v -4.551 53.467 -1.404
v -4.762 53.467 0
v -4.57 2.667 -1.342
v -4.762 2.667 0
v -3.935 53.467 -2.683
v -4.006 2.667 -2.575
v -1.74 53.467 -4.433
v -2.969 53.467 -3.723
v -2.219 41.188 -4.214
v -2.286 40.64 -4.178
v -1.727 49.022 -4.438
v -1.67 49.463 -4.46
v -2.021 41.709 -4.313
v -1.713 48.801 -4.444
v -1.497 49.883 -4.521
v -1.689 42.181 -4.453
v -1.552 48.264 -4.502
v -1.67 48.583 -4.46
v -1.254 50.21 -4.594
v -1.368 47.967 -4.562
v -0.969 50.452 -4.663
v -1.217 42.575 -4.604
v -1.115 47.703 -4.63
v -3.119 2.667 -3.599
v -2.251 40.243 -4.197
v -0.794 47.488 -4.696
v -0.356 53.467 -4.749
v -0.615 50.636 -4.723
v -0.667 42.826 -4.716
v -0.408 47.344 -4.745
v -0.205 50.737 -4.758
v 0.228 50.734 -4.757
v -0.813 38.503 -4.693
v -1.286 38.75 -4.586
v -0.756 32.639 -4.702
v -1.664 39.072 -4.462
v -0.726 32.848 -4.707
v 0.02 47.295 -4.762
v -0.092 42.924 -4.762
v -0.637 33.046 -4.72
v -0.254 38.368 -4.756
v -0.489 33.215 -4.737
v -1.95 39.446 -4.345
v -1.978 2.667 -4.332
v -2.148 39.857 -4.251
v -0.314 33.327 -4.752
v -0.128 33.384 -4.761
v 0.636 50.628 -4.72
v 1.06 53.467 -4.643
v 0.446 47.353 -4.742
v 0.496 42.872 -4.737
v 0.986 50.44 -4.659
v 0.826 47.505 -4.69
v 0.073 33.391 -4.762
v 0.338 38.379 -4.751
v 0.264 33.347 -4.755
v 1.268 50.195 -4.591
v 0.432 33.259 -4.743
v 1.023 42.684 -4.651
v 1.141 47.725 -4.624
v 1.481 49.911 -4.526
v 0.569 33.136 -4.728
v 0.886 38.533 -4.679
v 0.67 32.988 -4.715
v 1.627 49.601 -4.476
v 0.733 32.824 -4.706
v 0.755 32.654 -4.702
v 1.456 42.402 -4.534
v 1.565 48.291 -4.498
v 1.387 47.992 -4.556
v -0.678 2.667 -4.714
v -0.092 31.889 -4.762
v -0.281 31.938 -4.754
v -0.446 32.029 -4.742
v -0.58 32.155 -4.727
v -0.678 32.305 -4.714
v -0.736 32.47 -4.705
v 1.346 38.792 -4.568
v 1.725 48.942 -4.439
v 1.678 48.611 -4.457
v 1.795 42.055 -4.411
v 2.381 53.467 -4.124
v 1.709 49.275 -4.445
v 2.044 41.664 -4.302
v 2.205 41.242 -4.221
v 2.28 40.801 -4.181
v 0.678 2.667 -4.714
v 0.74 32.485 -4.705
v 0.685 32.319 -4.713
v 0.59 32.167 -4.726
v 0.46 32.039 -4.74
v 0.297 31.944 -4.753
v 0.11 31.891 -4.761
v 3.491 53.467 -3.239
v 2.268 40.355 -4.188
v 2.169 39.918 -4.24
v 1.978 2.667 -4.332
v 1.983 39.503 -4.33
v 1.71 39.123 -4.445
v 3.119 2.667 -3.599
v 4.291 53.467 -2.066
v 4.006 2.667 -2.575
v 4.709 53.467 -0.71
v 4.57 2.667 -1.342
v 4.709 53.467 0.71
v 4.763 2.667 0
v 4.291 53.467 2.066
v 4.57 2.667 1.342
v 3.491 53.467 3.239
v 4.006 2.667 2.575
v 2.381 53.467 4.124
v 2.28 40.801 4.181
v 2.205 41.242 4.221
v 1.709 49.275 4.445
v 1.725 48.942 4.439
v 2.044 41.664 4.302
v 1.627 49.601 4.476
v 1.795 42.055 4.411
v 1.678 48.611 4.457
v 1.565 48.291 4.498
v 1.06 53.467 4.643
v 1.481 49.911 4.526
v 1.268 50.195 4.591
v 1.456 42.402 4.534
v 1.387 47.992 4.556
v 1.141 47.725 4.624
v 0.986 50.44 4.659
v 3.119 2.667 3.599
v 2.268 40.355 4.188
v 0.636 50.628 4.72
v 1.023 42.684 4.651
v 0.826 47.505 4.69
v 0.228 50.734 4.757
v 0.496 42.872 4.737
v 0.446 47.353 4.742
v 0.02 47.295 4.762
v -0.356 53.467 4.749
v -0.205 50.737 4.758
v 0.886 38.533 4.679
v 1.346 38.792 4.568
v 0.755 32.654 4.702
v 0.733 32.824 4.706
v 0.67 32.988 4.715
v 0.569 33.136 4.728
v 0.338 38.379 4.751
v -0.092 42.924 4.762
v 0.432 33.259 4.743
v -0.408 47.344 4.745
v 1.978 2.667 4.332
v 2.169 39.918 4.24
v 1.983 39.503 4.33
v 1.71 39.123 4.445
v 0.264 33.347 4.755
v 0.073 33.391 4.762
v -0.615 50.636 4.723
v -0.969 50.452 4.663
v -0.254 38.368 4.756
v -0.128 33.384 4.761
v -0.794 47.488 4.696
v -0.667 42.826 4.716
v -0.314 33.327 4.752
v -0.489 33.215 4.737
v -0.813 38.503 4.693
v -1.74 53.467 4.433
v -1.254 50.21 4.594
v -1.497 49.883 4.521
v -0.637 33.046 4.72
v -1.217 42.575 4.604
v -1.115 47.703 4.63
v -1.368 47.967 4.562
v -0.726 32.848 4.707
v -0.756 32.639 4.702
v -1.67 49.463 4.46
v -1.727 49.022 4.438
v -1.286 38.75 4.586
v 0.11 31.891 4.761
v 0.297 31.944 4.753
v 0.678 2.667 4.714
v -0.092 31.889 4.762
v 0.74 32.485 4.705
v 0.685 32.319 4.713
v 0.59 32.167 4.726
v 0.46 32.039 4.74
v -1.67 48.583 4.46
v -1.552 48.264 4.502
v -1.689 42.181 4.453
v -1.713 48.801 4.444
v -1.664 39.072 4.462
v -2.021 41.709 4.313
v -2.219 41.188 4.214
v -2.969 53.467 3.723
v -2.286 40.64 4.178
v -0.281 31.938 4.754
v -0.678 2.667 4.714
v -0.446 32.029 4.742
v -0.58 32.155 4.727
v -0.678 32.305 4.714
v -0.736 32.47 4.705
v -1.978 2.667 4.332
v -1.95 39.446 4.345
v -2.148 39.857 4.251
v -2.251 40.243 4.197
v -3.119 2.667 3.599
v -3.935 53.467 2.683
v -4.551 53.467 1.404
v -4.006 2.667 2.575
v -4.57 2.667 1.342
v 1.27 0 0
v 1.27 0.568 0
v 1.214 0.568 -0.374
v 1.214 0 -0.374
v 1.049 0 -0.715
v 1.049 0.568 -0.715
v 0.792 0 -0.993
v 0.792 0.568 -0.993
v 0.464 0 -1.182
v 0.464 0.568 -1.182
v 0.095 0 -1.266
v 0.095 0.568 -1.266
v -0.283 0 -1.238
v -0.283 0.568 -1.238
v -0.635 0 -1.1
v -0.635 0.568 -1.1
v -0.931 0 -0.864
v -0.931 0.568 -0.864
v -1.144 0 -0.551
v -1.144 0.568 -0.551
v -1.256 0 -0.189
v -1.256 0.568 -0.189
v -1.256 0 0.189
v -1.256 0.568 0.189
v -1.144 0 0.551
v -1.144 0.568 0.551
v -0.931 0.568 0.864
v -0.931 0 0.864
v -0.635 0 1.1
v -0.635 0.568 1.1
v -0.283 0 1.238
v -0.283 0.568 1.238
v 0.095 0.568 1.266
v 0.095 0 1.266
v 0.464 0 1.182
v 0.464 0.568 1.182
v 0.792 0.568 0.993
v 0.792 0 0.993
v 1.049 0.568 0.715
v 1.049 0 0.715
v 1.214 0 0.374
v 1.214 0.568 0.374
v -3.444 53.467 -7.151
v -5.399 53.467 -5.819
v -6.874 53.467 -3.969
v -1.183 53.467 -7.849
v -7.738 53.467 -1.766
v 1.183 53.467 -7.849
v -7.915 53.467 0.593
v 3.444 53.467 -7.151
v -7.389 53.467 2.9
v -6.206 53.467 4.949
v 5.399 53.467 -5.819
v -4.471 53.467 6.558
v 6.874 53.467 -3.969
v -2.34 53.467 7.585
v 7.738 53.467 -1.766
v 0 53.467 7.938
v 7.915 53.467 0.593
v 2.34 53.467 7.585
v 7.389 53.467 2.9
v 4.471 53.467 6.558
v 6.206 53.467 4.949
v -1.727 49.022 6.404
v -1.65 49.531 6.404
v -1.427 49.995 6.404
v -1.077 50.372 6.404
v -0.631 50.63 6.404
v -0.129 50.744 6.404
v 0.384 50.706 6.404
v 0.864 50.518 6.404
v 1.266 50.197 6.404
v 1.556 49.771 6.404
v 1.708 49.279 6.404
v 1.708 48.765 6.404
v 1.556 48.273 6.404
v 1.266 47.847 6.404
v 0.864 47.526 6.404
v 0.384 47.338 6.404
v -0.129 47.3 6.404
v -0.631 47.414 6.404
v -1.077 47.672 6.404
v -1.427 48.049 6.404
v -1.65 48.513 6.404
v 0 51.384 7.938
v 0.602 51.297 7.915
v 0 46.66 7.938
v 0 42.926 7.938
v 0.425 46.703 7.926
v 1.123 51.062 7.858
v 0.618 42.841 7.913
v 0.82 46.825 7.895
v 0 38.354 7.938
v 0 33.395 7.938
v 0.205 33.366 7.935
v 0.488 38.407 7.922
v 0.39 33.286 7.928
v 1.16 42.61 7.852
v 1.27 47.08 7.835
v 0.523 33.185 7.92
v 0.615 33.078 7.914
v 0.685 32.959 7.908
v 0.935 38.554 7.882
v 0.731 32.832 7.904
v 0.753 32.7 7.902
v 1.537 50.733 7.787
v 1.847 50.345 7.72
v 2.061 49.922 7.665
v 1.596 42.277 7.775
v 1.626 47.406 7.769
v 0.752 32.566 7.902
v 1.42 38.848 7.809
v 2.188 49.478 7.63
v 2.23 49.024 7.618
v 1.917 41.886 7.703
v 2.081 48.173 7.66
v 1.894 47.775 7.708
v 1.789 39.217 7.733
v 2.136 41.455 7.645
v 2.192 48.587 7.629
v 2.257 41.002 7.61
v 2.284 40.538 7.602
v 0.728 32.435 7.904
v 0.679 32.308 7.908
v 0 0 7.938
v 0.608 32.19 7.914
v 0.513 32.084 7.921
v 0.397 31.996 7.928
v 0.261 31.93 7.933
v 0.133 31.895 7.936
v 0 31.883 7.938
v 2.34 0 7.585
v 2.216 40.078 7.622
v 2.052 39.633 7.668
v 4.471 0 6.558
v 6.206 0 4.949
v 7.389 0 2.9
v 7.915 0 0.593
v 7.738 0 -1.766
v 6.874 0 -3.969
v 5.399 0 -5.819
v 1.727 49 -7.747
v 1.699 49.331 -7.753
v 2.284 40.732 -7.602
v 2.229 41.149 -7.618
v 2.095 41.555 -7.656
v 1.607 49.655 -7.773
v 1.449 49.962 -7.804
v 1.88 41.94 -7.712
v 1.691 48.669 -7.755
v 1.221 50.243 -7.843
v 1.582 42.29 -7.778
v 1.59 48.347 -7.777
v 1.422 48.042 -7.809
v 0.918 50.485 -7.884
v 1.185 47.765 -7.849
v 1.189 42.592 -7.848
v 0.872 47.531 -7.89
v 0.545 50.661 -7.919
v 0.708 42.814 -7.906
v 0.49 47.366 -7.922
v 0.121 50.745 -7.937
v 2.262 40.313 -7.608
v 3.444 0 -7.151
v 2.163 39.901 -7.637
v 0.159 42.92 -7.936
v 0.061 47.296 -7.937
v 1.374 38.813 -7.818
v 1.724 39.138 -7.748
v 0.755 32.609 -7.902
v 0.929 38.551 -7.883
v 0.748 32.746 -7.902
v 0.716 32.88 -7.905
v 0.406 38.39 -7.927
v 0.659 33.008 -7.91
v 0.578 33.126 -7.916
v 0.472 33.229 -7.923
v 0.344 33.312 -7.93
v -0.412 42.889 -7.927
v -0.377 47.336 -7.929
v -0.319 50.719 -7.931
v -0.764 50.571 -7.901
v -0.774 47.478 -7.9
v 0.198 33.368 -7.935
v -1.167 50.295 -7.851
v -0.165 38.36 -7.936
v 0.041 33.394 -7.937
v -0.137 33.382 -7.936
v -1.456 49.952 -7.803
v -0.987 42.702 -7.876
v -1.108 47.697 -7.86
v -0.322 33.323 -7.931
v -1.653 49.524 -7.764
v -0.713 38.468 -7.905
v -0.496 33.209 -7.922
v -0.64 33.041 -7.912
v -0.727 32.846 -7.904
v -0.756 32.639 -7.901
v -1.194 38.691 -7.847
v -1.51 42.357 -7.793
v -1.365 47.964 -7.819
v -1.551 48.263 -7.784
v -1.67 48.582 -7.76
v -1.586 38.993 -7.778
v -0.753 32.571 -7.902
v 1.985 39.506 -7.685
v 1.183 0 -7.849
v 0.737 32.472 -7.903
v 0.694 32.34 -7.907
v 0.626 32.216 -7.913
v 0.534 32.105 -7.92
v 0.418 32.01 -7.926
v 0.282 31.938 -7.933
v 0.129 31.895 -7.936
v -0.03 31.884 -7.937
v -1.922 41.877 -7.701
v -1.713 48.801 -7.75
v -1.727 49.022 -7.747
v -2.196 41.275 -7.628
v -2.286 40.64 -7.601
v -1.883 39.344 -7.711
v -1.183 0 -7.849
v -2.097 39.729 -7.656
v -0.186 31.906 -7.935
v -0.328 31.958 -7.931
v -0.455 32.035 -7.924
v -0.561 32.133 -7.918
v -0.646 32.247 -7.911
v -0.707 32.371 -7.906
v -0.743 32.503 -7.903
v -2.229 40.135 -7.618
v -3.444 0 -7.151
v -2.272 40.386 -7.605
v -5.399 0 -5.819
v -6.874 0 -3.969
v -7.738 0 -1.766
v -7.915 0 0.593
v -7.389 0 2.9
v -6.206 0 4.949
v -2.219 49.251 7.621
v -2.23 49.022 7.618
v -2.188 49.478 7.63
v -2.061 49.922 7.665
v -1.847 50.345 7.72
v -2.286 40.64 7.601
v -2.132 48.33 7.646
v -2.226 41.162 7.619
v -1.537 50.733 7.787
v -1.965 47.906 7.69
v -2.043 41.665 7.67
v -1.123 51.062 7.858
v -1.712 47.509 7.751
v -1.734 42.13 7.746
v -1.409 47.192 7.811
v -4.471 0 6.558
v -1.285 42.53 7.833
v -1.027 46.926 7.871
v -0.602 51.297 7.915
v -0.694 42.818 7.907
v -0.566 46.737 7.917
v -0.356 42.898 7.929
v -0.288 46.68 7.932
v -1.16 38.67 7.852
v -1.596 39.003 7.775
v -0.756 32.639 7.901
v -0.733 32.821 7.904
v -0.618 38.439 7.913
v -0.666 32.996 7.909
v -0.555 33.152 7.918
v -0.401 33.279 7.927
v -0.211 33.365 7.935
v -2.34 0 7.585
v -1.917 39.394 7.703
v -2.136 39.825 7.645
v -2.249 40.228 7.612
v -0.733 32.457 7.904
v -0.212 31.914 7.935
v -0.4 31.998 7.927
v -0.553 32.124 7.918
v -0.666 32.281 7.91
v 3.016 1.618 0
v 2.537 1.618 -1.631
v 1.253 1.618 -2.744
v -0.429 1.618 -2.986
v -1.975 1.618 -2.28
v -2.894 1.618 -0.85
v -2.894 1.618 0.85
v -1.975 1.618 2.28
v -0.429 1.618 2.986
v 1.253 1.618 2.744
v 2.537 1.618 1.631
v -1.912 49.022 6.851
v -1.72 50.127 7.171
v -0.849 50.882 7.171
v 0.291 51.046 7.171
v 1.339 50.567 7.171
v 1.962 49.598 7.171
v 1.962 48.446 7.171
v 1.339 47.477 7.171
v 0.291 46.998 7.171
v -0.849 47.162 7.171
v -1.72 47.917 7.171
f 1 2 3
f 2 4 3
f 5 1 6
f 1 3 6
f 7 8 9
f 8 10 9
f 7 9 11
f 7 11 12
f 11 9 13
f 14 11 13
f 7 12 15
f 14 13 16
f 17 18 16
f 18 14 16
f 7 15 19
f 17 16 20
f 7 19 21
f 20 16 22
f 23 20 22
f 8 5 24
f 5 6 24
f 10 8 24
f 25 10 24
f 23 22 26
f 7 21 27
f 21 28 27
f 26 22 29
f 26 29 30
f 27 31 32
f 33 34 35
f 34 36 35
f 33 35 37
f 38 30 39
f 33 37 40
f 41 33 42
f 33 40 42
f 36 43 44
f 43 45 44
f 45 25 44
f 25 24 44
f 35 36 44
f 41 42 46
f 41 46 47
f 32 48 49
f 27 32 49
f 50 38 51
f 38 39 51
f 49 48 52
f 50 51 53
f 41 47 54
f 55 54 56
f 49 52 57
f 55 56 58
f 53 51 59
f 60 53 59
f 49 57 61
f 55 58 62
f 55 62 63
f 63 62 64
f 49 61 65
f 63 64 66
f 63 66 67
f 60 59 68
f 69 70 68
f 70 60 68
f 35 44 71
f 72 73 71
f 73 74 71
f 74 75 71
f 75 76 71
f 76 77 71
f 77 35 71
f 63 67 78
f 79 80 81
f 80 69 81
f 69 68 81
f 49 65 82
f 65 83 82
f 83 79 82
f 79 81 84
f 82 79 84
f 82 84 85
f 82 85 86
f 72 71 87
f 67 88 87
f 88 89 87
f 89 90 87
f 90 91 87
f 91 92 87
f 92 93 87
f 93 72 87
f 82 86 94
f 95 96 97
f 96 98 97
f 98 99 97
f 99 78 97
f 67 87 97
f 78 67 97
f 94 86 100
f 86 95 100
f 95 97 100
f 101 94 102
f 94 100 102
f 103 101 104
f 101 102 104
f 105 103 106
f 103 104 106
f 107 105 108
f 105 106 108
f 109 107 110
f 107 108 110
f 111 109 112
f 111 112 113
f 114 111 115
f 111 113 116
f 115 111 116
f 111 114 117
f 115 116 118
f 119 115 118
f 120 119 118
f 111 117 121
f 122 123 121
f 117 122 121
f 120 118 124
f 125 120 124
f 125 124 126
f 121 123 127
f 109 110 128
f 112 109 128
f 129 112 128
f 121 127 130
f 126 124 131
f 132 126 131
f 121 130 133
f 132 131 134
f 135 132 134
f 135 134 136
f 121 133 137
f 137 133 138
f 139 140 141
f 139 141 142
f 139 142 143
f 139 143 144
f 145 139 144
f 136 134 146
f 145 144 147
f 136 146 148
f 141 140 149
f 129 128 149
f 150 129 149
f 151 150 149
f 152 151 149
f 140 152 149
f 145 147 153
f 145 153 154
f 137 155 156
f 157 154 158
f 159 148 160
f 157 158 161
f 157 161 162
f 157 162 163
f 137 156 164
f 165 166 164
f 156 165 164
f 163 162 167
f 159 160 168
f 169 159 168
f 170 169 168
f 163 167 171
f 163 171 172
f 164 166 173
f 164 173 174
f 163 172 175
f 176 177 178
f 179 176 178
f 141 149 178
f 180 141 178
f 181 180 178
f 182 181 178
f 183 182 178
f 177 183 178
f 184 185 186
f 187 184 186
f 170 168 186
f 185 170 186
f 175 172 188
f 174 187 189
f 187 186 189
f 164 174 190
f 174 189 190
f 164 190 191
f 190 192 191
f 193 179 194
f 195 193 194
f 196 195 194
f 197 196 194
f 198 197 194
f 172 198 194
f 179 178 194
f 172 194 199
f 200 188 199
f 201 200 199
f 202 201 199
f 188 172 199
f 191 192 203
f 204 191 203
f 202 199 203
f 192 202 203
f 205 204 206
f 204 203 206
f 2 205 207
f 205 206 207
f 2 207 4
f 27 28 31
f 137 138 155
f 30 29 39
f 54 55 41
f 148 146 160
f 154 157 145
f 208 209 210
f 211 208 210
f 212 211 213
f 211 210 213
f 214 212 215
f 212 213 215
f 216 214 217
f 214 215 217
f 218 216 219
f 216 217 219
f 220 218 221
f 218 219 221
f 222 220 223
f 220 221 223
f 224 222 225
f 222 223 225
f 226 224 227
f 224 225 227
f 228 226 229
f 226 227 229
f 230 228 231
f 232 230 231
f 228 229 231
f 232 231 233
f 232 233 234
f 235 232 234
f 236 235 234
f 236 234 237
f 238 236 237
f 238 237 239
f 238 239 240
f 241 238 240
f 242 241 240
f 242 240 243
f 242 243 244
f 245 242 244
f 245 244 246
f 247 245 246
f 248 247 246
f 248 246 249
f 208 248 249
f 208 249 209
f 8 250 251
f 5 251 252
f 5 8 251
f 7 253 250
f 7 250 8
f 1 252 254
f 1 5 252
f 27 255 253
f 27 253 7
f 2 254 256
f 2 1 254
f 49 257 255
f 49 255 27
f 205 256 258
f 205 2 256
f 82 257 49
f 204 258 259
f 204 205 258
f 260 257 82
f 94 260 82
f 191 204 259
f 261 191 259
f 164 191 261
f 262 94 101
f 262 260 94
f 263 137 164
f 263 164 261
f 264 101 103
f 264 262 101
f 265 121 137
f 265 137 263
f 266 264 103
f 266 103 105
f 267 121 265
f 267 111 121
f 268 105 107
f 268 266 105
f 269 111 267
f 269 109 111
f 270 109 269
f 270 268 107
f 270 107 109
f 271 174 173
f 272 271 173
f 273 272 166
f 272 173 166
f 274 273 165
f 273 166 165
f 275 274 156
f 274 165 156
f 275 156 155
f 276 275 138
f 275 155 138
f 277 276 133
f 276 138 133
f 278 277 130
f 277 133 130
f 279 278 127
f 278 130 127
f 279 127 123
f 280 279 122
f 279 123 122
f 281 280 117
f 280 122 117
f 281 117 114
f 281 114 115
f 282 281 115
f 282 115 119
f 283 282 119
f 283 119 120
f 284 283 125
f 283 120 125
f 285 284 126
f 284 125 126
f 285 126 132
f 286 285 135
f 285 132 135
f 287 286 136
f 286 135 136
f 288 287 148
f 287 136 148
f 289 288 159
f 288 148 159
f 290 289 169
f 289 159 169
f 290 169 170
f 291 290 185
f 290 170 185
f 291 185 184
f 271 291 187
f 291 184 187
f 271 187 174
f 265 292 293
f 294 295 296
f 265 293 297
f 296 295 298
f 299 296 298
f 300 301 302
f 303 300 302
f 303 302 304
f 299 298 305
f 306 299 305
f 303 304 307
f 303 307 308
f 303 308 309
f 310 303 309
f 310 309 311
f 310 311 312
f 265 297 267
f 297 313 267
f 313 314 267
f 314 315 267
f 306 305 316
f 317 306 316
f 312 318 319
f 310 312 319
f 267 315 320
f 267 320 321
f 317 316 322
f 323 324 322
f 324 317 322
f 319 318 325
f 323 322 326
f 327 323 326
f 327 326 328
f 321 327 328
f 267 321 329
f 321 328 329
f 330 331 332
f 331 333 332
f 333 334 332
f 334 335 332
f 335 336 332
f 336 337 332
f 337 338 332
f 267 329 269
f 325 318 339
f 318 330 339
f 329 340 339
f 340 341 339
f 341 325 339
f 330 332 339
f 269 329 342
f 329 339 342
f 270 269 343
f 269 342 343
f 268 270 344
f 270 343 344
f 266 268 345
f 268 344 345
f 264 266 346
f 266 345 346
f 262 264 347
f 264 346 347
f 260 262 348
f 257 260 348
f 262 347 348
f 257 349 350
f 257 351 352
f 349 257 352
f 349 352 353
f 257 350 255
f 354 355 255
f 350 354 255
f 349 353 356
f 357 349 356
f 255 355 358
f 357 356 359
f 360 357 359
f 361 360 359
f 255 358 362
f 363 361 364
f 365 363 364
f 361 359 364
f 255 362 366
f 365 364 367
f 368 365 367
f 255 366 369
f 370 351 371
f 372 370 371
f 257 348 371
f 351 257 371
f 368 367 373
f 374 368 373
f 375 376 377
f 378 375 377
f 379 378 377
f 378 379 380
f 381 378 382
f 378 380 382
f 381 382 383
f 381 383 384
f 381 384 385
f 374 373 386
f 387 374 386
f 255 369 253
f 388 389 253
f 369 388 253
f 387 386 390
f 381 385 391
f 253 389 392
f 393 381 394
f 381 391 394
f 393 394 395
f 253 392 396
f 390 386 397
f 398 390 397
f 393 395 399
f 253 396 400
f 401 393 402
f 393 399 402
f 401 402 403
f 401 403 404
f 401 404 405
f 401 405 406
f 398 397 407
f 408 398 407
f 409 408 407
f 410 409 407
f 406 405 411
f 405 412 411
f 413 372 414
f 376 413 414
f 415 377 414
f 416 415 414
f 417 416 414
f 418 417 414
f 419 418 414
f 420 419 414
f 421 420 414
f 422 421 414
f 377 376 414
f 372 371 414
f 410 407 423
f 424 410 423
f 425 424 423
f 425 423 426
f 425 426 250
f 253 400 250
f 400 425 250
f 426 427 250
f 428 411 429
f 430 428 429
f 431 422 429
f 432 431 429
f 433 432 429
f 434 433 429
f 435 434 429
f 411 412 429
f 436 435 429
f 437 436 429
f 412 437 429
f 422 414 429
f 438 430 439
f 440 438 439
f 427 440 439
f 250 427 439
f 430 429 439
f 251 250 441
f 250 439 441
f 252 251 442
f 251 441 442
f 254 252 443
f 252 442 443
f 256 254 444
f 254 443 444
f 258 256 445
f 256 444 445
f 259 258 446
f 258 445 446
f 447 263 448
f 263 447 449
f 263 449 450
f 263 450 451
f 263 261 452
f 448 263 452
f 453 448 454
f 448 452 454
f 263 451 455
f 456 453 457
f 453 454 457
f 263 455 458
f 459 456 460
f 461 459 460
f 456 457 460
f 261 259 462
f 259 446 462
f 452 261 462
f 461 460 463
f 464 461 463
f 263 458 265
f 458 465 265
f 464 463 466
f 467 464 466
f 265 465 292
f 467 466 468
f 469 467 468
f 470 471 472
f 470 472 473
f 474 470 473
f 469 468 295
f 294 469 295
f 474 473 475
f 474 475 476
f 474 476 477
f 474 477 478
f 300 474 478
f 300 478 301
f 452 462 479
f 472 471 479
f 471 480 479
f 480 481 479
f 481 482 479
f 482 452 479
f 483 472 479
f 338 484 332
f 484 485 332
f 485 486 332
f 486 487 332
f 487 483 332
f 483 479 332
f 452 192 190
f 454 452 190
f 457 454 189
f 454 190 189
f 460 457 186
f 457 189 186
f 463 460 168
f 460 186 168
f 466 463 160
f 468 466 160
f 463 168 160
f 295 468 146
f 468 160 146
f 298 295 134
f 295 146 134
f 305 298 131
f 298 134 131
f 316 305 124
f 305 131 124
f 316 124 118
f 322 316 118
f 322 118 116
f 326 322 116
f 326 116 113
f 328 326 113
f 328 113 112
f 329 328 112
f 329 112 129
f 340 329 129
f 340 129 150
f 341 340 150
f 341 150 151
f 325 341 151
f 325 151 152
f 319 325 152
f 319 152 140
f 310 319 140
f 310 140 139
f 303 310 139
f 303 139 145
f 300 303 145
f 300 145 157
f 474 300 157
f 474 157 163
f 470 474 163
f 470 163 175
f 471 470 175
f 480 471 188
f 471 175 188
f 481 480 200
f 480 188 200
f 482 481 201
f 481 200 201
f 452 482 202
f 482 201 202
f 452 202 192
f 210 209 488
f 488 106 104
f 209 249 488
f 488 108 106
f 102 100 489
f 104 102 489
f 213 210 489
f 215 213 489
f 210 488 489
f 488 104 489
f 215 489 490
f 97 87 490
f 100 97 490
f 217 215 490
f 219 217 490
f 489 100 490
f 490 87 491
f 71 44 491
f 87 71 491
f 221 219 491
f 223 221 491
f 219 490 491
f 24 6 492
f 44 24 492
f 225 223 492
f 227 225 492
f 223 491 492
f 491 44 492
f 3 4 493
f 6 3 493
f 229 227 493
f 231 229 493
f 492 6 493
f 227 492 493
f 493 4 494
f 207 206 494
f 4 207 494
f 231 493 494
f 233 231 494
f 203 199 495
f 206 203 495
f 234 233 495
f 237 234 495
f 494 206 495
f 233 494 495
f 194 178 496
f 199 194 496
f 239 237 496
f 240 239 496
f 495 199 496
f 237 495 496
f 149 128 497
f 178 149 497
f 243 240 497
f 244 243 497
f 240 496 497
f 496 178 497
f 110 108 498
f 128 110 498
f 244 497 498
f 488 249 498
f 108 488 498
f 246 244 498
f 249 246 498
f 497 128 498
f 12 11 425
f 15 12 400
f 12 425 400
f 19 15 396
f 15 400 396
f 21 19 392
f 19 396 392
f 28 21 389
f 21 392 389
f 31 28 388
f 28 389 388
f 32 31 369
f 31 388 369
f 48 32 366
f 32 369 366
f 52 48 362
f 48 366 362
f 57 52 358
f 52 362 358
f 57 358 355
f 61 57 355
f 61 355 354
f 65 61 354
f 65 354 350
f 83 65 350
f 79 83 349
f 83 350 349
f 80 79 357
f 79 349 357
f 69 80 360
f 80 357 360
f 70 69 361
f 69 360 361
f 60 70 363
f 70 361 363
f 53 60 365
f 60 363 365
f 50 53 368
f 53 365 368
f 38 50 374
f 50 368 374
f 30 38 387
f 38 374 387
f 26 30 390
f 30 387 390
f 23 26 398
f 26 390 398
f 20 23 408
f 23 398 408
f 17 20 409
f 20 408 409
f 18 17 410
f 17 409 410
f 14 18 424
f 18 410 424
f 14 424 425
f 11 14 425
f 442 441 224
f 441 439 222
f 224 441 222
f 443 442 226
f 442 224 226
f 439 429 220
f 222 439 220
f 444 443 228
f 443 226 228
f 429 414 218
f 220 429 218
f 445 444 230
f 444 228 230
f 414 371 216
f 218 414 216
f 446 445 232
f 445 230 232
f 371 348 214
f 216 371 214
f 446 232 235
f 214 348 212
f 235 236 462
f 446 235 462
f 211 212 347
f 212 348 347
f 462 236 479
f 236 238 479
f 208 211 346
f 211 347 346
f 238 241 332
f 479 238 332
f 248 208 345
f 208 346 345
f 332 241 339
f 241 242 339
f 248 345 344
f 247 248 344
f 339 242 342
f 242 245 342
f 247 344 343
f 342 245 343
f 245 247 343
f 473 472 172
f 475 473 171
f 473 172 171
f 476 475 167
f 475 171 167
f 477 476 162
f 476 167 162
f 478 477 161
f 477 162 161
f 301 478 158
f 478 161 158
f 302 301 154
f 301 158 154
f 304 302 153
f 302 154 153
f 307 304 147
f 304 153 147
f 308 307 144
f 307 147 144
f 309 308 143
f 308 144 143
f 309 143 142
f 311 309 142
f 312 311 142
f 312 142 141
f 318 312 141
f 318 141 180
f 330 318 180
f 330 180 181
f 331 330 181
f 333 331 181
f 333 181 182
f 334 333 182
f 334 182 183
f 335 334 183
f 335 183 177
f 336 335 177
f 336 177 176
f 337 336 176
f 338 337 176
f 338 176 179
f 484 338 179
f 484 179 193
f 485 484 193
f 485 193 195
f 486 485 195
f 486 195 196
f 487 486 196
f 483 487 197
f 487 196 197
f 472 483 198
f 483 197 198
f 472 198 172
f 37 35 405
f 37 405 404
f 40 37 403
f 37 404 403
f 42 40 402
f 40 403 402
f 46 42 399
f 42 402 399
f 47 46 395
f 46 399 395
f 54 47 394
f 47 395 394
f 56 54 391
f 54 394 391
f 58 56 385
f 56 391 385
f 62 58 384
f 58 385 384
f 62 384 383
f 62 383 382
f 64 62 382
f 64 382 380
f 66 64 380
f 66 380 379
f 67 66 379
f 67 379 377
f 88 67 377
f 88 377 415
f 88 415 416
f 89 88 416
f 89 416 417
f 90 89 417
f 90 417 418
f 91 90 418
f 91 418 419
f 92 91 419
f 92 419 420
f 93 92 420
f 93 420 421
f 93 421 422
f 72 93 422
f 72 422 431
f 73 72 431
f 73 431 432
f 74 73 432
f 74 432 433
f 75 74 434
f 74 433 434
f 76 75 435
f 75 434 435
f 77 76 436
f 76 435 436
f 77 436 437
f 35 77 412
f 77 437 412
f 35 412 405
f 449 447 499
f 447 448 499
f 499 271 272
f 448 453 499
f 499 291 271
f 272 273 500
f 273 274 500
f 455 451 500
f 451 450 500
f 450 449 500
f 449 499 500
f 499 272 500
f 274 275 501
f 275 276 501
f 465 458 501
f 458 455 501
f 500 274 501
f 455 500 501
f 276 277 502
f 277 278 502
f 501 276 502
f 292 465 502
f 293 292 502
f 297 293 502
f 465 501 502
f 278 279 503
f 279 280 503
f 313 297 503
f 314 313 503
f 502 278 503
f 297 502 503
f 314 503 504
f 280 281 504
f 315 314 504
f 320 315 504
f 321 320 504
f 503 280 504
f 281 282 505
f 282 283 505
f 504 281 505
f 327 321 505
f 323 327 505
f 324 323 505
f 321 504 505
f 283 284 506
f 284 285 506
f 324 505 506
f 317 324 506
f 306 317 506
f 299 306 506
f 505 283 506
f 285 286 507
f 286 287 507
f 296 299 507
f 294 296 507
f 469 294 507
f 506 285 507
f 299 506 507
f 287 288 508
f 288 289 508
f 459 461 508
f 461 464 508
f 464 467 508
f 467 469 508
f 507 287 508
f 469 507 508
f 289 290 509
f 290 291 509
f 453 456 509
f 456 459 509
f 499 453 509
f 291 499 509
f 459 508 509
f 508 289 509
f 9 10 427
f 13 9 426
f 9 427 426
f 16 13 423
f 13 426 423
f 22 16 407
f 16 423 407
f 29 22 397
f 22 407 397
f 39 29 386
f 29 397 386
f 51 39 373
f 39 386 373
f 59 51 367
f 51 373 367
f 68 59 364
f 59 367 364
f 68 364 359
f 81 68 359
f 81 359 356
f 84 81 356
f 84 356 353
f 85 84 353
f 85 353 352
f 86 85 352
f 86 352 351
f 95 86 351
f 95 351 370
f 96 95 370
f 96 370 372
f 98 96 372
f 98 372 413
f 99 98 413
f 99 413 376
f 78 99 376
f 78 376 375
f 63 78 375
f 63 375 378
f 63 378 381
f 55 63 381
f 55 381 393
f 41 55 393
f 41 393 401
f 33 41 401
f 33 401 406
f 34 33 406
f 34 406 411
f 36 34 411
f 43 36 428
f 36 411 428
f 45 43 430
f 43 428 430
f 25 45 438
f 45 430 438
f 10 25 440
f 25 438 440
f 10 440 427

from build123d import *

# Parameters (mm, degrees)
SKETCH1_R                             = 7.9375
BOSS_EXTRUDE1_DEPTH                   = 53.467
F_29_0_136_DIAMETER_HOLE1_D           = 3.4544
F_29_0_136_DIAMETER_HOLE1_CSINK_D     = 4.7244
F_29_0_136_DIAMETER_HOLE1_CSINK_ANGLE = 45
F_15_0_18_DIAMETER_HOLE1_D            = 4.572
F_53_0_0595_DIAMETER_HOLE1_D          = 1.5113
F_3_8_0_375_DIAMETER_HOLE1_D          = 9.525
F_3_8_0_375_DIAMETER_HOLE1_DEPTH      = 50.8
F_3_8_0_375_DIAMETER_HOLE1_TIP        = 2.861598698
F_39_0_0995_DIAMETER_HOLE1_D          = 2.54


with BuildPart() as part:
    # Sketch1 → Boss-Extrude1 (new body)
    with BuildSketch(Plane(origin=(0, 0, 0), x_dir=(1, 0, 0), z_dir=(0, 1, 0))):
        with Locations(Location((0, 0, 0), (0, 0, 270))):
            Circle(SKETCH1_R)
    extrude(amount=BOSS_EXTRUDE1_DEPTH)

    # #29 (0.136) Diameter Hole1 (through all)
    with Locations(Plane.XY.offset(7.9375)):
        with Locations((0, 49.022)):
            CounterSinkHole(F_29_0_136_DIAMETER_HOLE1_D / 2, F_29_0_136_DIAMETER_HOLE1_CSINK_D / 2, counter_sink_angle=F_29_0_136_DIAMETER_HOLE1_CSINK_ANGLE)

    # #15 (0.18) Diameter Hole1 (through all)
    with Locations(Plane.XY.offset(7.9375)):
        with Locations((0, 40.64)):
            Hole(F_15_0_18_DIAMETER_HOLE1_D / 2)

    # #53 (0.0595) Diameter Hole1 (through all)
    with Locations(Plane.XY.offset(7.9375)):
        with Locations((0, 32.639)):
            Hole(F_53_0_0595_DIAMETER_HOLE1_D / 2)

    # 3/8 (0.375) Diameter Hole1
    with Locations(Plane(origin=(0, 53.467, 0), x_dir=(1, 0, 0), z_dir=(0, 1, 0))):
        with Locations((0, 0)):
            Hole(F_3_8_0_375_DIAMETER_HOLE1_D / 2, depth=F_3_8_0_375_DIAMETER_HOLE1_DEPTH)
            with Locations((0, 0, -(F_3_8_0_375_DIAMETER_HOLE1_DEPTH + F_3_8_0_375_DIAMETER_HOLE1_TIP / 2))):  # 118° drill point
                Cone(0, F_3_8_0_375_DIAMETER_HOLE1_D / 2, F_3_8_0_375_DIAMETER_HOLE1_TIP, mode=Mode.SUBTRACT)

    # #39 (0.0995) Diameter Hole1 (through all)
    with Locations(Plane(origin=(0, 0, 0), x_dir=(-1, 0, 0), z_dir=(0, -1, 0))):
        with Locations((0, 0)):
            Hole(F_39_0_0995_DIAMETER_HOLE1_D / 2)


solid = part.part
